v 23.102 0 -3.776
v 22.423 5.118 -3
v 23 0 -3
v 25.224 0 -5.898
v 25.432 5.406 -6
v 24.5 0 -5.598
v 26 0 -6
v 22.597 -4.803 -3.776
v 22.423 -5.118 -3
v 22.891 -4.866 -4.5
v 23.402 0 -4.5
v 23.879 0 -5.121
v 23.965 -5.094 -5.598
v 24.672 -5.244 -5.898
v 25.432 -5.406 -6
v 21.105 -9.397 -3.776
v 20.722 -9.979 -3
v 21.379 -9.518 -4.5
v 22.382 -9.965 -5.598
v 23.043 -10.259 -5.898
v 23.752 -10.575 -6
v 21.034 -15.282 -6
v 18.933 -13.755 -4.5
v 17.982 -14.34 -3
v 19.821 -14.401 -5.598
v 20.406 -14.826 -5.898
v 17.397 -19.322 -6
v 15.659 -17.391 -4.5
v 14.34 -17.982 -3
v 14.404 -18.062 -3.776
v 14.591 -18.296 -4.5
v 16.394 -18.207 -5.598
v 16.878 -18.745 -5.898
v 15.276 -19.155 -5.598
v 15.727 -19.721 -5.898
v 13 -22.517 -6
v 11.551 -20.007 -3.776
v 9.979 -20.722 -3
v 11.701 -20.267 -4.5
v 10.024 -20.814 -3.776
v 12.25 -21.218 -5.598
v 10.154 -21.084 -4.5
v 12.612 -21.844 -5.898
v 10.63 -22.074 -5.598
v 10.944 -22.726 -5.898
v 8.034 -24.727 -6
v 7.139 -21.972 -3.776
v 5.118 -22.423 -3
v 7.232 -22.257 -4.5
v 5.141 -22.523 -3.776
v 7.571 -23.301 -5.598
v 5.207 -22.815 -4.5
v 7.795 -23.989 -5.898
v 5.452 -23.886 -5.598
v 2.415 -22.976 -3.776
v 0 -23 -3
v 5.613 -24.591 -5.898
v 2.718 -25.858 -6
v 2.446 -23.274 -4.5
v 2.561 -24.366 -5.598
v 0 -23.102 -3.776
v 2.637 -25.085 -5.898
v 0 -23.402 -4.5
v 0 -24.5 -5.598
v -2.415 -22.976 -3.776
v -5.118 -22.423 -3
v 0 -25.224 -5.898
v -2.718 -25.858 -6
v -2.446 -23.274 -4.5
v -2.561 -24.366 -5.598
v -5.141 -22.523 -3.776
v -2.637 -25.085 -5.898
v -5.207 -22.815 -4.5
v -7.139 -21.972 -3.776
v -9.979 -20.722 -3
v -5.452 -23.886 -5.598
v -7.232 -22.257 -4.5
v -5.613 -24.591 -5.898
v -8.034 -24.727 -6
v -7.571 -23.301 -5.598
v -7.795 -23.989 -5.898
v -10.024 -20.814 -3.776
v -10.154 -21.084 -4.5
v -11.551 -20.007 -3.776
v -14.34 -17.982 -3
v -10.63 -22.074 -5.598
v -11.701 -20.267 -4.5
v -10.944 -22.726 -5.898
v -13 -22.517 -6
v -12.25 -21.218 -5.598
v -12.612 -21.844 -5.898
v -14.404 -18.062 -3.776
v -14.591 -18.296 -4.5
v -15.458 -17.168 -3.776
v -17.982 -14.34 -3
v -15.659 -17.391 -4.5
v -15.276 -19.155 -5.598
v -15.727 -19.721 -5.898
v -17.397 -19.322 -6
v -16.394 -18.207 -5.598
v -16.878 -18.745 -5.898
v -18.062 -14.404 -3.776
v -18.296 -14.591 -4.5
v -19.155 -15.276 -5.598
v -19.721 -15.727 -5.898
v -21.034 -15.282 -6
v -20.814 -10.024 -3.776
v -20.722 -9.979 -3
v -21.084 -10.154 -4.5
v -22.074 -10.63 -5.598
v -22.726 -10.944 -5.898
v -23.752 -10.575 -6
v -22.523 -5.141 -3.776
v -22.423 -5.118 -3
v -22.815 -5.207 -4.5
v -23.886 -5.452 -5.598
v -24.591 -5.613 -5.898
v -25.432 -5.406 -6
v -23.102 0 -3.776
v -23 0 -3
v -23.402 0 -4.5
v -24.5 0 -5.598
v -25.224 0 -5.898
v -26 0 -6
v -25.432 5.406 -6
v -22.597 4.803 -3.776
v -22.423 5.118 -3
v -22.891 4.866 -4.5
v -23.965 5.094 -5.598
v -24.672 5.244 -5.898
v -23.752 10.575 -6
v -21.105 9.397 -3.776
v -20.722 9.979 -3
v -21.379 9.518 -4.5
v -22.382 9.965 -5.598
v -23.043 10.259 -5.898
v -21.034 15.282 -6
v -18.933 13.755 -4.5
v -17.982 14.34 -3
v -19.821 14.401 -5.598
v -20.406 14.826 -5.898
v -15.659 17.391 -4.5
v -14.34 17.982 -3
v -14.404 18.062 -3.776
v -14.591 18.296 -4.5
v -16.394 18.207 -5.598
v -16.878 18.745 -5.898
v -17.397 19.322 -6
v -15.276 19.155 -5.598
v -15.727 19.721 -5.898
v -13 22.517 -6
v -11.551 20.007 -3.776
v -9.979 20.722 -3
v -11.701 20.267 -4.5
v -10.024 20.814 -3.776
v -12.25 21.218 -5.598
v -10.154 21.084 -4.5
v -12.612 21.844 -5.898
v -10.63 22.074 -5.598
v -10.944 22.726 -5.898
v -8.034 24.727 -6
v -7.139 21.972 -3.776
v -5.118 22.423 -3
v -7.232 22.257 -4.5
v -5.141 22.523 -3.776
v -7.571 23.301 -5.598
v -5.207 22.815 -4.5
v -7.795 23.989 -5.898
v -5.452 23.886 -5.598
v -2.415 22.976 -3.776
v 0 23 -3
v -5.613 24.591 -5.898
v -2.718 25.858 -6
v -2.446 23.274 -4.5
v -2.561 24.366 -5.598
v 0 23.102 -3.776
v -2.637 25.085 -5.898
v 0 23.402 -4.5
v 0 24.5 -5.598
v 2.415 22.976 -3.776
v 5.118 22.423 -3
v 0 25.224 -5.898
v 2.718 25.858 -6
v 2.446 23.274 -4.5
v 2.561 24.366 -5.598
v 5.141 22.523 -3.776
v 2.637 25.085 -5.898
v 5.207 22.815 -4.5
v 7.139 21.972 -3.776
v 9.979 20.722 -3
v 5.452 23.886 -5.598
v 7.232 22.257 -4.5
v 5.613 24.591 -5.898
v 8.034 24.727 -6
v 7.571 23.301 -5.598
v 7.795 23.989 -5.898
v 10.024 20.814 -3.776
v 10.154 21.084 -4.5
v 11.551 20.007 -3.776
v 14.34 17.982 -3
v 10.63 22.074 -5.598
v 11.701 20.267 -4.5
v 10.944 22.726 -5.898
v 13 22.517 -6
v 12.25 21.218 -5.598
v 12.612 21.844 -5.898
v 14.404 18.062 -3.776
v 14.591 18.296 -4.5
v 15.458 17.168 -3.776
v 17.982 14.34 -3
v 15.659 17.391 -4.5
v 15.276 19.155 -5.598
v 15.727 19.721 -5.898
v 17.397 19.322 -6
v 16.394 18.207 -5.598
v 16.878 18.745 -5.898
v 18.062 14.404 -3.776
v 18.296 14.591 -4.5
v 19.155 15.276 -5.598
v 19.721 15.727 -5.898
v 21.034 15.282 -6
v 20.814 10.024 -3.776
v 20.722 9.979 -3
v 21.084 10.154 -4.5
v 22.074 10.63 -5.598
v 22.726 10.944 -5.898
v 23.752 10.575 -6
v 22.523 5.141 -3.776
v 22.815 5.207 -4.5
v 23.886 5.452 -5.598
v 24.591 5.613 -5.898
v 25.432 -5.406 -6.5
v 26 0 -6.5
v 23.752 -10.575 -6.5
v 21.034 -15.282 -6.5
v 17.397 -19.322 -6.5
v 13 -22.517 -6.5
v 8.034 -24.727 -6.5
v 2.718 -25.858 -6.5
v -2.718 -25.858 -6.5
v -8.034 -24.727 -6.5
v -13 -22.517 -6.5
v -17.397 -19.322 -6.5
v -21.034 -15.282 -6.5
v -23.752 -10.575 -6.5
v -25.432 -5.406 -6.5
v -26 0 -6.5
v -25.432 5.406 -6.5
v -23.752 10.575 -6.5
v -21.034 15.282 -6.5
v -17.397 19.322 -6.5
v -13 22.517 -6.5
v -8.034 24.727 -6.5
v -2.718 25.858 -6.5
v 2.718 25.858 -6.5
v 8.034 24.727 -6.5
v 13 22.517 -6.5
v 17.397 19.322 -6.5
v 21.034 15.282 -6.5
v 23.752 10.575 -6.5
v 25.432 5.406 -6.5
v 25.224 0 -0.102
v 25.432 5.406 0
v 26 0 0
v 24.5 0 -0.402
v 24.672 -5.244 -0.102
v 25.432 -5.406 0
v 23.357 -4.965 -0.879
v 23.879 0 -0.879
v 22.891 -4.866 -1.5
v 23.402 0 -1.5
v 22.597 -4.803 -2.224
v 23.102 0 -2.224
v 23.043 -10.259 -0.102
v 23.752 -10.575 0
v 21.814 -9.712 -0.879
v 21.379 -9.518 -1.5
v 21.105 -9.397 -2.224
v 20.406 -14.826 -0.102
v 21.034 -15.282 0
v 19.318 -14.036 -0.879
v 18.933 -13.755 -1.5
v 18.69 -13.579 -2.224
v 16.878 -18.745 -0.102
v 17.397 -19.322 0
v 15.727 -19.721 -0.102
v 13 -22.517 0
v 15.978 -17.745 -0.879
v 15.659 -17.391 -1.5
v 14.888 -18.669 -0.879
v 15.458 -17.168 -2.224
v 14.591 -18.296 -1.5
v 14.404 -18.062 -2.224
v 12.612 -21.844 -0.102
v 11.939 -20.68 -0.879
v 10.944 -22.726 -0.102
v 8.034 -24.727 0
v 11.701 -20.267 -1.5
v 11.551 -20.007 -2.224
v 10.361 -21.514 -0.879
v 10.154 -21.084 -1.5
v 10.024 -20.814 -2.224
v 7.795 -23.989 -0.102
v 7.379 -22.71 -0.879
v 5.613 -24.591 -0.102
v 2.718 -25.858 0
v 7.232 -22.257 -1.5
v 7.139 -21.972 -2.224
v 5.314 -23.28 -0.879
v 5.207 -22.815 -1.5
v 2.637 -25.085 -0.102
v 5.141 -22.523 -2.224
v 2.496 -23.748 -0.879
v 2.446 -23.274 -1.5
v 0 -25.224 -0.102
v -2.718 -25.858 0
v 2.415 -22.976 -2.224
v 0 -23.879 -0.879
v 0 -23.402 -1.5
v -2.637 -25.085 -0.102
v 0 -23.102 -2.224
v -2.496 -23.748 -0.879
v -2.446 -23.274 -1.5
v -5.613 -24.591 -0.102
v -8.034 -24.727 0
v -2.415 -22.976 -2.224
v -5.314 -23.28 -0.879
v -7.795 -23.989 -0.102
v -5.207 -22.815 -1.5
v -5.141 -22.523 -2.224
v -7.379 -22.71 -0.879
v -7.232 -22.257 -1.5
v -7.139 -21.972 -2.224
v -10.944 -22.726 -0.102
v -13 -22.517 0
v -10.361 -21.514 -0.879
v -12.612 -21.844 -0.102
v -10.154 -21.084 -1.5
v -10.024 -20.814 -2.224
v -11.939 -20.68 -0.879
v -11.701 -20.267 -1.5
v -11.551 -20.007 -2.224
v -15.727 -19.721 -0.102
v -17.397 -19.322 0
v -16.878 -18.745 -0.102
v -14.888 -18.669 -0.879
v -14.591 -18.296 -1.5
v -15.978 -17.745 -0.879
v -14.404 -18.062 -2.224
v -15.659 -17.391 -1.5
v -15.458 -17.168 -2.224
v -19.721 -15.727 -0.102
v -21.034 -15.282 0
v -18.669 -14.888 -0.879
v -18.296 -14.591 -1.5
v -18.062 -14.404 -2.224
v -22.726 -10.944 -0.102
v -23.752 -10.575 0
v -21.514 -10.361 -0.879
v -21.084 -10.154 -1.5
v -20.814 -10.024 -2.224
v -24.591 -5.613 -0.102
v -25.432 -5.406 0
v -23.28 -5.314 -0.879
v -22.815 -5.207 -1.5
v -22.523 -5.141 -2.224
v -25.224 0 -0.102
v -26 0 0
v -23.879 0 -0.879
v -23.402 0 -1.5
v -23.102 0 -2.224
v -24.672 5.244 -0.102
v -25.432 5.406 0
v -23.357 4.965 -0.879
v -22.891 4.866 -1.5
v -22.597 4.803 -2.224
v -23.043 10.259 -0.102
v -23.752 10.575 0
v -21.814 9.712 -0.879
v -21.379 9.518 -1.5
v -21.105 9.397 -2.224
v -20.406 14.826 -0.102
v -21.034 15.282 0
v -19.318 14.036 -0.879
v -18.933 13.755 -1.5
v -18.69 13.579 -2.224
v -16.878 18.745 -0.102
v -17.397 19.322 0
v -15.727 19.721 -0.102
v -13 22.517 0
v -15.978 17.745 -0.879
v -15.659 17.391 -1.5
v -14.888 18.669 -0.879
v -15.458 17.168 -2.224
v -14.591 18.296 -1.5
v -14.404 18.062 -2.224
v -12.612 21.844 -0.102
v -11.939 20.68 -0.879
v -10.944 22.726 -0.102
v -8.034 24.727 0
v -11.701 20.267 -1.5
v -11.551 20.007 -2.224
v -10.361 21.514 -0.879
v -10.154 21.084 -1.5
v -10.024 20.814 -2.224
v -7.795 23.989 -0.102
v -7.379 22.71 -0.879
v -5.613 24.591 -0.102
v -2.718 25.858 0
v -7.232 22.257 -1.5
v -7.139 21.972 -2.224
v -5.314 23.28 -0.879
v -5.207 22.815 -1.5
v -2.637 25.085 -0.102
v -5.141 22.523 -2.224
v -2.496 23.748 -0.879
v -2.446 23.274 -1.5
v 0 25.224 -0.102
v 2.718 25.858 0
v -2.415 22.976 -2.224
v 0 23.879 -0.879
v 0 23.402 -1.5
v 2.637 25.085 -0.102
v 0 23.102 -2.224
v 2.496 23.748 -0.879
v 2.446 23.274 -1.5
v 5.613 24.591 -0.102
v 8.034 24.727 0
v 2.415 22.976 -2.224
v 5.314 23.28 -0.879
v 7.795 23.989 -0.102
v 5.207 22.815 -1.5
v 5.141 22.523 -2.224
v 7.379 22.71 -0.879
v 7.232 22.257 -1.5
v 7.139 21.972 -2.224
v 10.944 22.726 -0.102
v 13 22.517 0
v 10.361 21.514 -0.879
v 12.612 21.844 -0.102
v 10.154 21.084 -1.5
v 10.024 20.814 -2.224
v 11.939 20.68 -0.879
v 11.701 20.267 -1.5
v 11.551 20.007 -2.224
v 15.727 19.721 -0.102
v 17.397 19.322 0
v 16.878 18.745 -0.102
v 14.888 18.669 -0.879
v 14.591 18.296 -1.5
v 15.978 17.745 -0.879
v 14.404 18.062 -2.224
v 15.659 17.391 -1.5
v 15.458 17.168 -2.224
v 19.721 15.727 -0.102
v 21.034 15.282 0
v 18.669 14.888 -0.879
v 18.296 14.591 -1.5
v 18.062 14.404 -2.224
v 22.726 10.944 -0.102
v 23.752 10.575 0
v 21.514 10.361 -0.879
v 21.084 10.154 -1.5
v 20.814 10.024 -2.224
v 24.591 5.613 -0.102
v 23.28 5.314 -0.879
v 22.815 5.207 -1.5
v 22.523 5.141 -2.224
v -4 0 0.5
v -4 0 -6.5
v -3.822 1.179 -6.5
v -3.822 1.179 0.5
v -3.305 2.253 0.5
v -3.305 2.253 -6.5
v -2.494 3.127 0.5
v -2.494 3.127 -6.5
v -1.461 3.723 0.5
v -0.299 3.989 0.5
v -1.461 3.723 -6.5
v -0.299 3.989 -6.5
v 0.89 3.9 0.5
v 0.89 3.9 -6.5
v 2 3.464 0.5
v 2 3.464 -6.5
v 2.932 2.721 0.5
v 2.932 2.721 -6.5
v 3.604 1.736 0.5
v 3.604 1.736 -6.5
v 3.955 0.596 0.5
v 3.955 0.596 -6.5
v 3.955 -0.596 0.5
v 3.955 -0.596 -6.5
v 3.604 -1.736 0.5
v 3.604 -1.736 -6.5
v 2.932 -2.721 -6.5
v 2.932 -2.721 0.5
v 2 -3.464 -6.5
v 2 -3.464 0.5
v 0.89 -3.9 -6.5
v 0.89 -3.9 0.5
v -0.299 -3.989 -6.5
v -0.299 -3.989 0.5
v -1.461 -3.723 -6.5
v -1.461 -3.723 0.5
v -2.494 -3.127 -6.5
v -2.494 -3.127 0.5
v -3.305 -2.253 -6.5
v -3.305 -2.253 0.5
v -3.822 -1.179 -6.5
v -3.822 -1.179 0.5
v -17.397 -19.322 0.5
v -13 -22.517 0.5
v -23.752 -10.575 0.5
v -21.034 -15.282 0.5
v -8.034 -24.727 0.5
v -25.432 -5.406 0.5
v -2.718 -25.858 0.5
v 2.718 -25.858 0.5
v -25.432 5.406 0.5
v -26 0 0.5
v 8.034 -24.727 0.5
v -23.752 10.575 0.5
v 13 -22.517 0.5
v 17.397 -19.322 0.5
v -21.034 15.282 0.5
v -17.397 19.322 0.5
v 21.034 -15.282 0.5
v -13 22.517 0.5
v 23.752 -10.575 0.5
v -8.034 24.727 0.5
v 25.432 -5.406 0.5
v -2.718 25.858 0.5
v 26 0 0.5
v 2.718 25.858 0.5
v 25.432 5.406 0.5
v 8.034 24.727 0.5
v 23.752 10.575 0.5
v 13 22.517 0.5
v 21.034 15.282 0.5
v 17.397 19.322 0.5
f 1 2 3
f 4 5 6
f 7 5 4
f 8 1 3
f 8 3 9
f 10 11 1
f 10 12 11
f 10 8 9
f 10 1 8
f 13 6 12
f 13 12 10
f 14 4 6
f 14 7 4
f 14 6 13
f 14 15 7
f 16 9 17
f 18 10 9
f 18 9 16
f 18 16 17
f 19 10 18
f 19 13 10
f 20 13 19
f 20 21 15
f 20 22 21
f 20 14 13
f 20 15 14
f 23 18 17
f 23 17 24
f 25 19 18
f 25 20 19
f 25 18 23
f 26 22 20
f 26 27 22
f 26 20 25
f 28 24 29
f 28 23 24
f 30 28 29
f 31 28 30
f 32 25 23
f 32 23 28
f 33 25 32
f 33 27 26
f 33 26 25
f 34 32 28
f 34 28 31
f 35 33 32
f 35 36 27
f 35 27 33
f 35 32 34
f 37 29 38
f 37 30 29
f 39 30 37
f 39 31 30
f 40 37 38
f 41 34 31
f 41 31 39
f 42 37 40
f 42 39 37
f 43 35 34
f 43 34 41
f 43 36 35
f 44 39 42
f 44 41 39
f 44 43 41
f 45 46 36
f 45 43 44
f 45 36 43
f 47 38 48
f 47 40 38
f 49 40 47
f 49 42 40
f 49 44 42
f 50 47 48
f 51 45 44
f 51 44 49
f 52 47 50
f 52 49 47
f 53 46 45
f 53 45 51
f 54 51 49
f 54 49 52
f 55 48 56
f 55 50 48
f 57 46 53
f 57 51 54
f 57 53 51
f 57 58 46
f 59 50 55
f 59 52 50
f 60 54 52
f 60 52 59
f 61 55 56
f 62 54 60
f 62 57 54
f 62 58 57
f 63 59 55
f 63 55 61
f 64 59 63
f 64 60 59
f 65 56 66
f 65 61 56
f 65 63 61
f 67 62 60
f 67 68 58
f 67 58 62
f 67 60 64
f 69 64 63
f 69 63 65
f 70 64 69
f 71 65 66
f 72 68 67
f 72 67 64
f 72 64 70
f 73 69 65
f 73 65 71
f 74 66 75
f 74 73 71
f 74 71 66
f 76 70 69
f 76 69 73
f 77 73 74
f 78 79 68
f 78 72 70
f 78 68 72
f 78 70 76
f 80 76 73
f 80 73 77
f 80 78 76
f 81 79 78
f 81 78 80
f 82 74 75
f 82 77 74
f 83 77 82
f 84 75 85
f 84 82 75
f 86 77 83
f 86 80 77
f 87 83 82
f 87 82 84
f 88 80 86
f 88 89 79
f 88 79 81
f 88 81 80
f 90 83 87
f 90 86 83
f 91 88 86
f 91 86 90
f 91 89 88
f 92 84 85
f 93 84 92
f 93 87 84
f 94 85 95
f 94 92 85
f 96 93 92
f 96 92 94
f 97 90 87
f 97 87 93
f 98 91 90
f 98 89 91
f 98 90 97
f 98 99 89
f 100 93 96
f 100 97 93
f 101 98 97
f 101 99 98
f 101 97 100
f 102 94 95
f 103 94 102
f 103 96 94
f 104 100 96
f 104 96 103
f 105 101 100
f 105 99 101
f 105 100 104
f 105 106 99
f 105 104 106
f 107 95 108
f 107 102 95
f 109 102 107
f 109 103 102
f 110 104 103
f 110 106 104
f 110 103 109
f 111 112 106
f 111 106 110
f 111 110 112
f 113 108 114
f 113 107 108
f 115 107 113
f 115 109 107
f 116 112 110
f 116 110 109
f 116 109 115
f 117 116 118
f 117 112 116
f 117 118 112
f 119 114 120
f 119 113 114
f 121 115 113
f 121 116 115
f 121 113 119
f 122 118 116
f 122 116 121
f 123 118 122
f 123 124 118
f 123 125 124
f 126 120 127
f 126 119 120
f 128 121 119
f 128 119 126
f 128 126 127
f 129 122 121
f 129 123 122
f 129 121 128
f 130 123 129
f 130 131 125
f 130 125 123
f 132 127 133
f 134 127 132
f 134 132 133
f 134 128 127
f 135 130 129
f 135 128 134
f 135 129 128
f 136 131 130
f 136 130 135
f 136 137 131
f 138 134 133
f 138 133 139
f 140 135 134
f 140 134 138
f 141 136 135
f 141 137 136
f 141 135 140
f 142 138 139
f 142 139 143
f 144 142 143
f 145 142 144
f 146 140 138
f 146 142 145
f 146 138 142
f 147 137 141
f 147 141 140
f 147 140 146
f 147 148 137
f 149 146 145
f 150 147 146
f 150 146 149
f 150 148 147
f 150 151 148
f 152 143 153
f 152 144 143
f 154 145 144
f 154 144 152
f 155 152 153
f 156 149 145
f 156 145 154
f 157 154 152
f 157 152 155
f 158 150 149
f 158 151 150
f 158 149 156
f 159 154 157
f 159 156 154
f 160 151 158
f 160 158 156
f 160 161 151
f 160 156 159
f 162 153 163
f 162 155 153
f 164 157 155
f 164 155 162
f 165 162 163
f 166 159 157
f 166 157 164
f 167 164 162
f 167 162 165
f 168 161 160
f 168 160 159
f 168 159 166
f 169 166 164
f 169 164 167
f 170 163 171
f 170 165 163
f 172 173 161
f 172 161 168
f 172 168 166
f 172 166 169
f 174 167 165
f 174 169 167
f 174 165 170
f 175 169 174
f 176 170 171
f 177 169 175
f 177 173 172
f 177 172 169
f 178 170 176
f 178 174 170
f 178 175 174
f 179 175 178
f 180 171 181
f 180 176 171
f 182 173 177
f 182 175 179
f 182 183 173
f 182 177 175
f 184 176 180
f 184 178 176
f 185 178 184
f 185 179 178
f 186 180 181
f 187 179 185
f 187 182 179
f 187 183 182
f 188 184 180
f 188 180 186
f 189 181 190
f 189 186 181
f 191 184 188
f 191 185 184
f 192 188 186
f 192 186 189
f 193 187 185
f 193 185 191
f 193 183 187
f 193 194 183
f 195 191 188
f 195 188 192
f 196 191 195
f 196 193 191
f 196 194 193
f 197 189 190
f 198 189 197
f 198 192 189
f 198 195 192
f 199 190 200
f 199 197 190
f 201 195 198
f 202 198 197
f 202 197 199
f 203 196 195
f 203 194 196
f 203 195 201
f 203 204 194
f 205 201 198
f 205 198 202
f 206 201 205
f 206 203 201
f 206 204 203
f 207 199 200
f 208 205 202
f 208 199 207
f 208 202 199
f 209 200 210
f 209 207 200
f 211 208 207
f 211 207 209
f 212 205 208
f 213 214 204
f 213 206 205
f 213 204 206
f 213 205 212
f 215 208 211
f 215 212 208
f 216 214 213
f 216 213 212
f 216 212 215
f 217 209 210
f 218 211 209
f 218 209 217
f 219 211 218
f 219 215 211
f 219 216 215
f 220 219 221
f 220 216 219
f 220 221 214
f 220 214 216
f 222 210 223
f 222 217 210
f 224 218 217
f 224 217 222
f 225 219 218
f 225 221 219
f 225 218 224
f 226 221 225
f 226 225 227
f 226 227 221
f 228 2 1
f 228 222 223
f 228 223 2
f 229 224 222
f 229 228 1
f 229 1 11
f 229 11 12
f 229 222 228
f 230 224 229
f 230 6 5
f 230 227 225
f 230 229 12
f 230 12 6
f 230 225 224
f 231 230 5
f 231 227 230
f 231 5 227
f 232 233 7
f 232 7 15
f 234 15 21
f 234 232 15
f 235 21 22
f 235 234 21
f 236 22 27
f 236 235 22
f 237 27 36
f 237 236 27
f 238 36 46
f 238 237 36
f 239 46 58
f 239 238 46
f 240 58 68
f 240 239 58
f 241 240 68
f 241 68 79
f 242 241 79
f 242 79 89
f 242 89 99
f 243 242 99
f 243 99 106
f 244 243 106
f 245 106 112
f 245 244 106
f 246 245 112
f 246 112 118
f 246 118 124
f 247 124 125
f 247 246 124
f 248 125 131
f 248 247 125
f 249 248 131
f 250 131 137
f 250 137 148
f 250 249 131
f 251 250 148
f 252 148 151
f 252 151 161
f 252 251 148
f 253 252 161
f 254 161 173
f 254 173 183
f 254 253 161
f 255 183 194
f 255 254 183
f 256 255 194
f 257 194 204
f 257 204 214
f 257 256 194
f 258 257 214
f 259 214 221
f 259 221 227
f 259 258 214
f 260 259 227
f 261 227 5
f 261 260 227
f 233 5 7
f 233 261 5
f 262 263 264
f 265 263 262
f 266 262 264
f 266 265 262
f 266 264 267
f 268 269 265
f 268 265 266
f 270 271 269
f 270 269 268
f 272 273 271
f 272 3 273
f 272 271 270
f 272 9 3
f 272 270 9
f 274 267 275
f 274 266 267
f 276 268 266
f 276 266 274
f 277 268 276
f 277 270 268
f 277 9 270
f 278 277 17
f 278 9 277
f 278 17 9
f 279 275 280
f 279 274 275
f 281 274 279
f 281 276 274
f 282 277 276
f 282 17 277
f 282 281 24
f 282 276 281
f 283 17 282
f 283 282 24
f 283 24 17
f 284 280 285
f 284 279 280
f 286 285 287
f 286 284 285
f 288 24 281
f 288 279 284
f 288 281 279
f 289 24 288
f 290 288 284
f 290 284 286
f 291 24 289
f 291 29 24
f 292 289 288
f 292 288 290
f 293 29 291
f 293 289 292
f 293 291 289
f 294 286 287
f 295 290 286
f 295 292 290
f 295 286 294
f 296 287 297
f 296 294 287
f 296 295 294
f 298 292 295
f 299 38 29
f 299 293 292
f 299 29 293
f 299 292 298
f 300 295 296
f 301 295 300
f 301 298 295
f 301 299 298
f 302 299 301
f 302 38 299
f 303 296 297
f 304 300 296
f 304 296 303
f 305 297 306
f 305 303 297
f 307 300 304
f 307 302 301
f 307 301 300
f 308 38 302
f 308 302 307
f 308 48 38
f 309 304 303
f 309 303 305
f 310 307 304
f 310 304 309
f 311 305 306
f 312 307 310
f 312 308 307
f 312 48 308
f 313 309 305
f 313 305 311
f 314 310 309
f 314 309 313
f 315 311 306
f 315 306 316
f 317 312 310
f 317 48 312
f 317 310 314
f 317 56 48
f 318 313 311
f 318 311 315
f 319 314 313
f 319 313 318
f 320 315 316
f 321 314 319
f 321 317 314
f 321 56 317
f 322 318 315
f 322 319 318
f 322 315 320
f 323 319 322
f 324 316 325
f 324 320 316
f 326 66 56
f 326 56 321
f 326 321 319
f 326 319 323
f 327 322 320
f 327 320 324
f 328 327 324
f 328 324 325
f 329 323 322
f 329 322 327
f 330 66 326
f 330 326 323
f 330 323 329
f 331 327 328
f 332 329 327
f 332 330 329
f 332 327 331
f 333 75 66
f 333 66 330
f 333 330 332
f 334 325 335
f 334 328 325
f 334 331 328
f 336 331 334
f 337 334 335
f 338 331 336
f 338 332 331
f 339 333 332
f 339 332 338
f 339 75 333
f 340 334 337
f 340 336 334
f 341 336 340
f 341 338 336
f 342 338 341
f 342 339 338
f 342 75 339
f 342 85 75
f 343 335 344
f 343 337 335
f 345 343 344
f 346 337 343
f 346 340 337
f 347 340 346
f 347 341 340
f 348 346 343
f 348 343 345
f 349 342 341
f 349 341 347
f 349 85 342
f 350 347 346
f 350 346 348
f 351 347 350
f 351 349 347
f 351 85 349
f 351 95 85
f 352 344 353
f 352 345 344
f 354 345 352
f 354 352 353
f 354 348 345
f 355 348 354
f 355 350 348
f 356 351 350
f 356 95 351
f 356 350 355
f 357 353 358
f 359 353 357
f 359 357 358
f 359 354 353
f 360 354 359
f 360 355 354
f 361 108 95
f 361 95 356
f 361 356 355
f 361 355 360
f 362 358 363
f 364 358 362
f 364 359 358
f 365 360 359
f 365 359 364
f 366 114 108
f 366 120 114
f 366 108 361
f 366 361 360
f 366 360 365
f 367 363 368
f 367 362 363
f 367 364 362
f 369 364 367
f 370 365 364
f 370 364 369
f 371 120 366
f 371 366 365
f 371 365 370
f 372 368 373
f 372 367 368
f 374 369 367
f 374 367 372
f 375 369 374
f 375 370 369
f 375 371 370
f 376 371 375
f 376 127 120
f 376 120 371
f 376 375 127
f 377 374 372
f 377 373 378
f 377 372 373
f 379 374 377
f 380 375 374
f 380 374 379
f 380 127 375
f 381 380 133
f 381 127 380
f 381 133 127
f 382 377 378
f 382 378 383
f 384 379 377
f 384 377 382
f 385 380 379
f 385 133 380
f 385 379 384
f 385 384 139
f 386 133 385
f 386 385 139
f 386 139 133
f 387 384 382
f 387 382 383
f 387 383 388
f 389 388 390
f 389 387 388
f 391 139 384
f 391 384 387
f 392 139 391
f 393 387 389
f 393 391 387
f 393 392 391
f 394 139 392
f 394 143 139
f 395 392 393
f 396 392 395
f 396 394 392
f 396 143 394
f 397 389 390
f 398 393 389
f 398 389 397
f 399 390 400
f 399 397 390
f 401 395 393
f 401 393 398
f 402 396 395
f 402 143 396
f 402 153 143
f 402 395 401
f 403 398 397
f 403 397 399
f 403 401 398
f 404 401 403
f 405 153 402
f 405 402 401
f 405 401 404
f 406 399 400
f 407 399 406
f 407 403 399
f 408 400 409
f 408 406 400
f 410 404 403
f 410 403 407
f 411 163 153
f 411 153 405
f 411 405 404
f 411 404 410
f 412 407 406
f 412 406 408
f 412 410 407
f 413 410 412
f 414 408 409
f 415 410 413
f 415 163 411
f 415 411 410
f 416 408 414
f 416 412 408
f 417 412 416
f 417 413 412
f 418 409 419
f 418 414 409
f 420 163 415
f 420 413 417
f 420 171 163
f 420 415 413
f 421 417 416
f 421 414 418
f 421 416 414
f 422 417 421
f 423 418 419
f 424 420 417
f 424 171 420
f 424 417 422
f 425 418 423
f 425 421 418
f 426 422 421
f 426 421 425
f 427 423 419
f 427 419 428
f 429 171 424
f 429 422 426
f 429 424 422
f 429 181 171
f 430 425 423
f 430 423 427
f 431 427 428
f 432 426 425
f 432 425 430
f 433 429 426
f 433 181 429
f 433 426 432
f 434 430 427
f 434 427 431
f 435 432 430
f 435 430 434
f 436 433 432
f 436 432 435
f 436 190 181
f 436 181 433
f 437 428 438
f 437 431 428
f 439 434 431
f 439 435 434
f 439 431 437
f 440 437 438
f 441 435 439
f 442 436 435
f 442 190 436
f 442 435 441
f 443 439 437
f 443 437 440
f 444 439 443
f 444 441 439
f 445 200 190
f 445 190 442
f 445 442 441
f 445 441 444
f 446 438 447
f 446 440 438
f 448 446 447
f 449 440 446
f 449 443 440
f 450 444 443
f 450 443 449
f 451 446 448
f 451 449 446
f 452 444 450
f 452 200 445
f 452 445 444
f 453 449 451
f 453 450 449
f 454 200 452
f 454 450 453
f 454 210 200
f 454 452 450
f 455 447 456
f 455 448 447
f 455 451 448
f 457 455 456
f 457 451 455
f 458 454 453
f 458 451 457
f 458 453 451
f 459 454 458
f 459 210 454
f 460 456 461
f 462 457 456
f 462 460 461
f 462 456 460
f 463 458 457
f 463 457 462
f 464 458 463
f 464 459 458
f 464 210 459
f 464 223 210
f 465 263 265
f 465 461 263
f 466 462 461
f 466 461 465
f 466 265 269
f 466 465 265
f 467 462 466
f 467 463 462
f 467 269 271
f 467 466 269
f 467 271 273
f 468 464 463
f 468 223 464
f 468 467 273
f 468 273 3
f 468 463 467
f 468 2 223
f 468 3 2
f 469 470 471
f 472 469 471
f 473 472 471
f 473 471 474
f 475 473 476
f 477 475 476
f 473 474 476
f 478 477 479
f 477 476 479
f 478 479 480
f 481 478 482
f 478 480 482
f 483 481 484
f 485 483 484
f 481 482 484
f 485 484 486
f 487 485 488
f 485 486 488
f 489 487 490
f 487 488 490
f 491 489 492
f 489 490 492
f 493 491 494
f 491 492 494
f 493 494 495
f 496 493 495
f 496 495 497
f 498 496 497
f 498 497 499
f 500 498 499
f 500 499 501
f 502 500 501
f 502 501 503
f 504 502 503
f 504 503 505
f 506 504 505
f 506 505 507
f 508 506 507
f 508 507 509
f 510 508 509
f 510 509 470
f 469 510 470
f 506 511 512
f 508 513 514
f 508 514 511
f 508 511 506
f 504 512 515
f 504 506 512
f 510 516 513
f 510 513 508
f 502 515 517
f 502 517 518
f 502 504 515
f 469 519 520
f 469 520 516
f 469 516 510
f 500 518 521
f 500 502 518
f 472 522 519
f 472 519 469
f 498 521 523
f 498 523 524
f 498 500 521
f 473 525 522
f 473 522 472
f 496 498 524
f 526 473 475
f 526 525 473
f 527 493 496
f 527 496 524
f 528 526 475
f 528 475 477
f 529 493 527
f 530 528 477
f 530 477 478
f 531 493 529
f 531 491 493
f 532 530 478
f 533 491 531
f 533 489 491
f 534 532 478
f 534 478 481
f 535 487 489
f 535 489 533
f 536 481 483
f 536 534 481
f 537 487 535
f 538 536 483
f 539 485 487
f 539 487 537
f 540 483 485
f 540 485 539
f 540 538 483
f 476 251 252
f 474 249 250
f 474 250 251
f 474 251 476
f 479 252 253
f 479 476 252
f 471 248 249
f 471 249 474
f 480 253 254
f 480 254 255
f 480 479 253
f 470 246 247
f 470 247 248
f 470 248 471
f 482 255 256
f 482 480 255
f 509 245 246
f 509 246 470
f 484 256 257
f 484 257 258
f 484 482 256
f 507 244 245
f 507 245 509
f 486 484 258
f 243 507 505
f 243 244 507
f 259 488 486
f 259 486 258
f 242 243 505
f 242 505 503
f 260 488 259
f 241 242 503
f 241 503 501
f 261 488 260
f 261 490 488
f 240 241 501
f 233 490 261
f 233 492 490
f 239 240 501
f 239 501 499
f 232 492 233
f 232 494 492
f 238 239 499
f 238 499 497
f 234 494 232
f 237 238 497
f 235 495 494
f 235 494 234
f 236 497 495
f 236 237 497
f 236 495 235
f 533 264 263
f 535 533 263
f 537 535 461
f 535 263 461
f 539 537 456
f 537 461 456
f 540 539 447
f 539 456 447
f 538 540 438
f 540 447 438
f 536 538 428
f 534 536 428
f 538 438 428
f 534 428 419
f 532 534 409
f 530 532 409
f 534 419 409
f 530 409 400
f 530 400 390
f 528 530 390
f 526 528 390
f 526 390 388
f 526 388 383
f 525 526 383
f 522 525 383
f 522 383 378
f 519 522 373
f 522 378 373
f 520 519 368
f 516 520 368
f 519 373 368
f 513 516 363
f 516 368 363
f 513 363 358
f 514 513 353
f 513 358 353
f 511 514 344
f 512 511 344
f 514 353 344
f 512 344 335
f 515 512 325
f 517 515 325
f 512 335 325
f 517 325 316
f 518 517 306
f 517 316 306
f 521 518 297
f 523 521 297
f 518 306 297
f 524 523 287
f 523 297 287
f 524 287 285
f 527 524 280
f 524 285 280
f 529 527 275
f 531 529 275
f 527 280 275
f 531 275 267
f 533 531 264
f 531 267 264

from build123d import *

# Parameters (mm, degrees)
SKETCH1_W           = 23
SKETCH1_H           = 6
SKETCH2_R           = 26
SKETCH2_R_2         = 1
BOSS_EXTRUDE1_DEPTH = 0.5
BOSS_EXTRUDE2_START = 0.5
SKETCH3_R           = 26
BOSS_EXTRUDE2_DEPTH = 0.5
SKETCH4_R           = 1
CUT_EXTRUDE2_DEPTH  = 7
SKETCH5_R           = 4
CUT_EXTRUDE3_DEPTH  = 10


with BuildPart() as part:
    # Sketch1 → Revolve1 (revolve)
    with BuildSketch(Plane(origin=(0, 0, 0), x_dir=(1, 0, 0), z_dir=(0, 1, 0))):
        with BuildLine():
            Line((23, 6), (23, 3))
            ThreePointArc((23, 3), (23.878679656, 5.121320344), (26, 6))
            Line((26, 6), (23, 6))
        make_face()
        with BuildLine():
            Line((23, 3), (23, 0))
            Line((23, 0), (26, 0))
            ThreePointArc((26, 0), (23.878679656, 0.878679656), (23, 3))
        make_face()
        with Locations((11.5, 3)):
            Rectangle(SKETCH1_W, SKETCH1_H)
    revolve(axis=Axis((0, 0, 0), (0, 0, -1)))

    # Sketch2 → Boss-Extrude1 (add)
    with BuildSketch(Plane.XY):
        Circle(SKETCH2_R)
        Circle(SKETCH2_R_2, mode=Mode.SUBTRACT)
    extrude(amount=BOSS_EXTRUDE1_DEPTH)

    # Sketch3 → Boss-Extrude2 (add)
    with BuildSketch(Plane(origin=(0, 0, -6), x_dir=(-1, 0, 0), z_dir=(0, 0, -1)).offset(BOSS_EXTRUDE2_START)):
        with Locations(Location((0, 0, 0), (0, 0, 180))):
            Circle(SKETCH3_R)
    extrude(amount=-BOSS_EXTRUDE2_DEPTH)

    # Sketch4 → Cut-Extrude2 (cut)
    with BuildSketch(Plane(origin=(0, 0, -6.5), x_dir=(-1, 0, 0), z_dir=(0, 0, -1))):
        Circle(SKETCH4_R)
    extrude(amount=-CUT_EXTRUDE2_DEPTH, mode=Mode.SUBTRACT)

    # Sketch5 → Cut-Extrude3 (cut)
    with BuildSketch(Plane(origin=(0, 0, -6.5), x_dir=(-1, 0, 0), z_dir=(0, 0, -1))):
        Circle(SKETCH5_R)
    extrude(amount=-CUT_EXTRUDE3_DEPTH, mode=Mode.SUBTRACT)


solid = part.part
